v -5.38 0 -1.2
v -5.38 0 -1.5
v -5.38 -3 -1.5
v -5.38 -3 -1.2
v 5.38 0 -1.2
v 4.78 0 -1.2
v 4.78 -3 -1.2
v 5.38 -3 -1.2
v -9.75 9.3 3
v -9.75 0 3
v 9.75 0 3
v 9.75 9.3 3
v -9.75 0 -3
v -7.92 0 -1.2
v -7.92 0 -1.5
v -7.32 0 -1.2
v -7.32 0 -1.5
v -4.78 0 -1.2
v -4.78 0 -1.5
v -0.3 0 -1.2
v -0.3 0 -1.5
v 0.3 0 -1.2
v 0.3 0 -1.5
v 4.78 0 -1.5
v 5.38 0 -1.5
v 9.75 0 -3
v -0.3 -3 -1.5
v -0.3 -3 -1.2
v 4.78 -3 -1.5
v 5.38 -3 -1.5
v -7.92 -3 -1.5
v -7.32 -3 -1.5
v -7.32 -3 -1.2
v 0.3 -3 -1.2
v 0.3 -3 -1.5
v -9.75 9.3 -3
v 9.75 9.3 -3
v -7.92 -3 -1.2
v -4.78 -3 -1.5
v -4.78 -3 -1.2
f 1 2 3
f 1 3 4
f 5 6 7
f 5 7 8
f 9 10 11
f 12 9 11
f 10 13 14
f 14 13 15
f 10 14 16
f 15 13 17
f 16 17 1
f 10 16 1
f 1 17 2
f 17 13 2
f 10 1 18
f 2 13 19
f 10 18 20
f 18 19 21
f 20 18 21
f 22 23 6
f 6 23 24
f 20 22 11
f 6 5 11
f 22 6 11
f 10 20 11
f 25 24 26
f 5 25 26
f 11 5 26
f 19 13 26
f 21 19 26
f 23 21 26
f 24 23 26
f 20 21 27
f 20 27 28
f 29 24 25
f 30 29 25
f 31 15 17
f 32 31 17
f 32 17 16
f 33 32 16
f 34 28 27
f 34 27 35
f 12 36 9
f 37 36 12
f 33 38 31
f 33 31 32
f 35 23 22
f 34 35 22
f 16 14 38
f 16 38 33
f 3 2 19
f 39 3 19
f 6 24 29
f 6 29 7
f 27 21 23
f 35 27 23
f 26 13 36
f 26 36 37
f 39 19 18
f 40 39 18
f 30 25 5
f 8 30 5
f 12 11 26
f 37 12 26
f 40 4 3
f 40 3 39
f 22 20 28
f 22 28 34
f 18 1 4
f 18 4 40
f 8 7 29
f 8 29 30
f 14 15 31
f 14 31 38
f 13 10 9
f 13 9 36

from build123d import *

# Parameters (mm, degrees)
SKETCH_1_W      = 19.5
SKETCH_1_H      = 6
EXTRUDE_1_DEPTH = 9.3
SKETCH_2_W      = 0.6
SKETCH_2_H      = 0.3
EXTRUDE_2_DEPTH = 3
EXTRUDE_3_DEPTH = 0.2


with BuildPart() as part:
    # Эскиз1 → Бобышка-Вытянуть1 (new body)
    with BuildSketch(Plane(origin=(0, 0, 0), x_dir=(1, 0, 0), z_dir=(0, 1, 0))):
        Rectangle(SKETCH_1_W, SKETCH_1_H)
    extrude(amount=EXTRUDE_1_DEPTH)

    # Эскиз2 → Бобышка-Вытянуть2 (add)
    with BuildSketch(Plane.XZ):
        with Locations((-7.62, -1.35)):
            Rectangle(SKETCH_2_W, SKETCH_2_H)
        with Locations((-5.08, -1.35)):
            Rectangle(SKETCH_2_W, SKETCH_2_H)
        with Locations((0, -1.35)):
            Rectangle(SKETCH_2_W, SKETCH_2_H)
        with Locations((5.08, -1.35)):
            Rectangle(SKETCH_2_W, SKETCH_2_H)
    extrude(amount=EXTRUDE_2_DEPTH)

    # Эскиз3 → Бобышка-Вытянуть3 (add)
    with BuildSketch(Plane(origin=(0, 9.3, 0), x_dir=(1, 0, 0), z_dir=(0, 1, 0))):
        with BuildLine():
            Line((-5.993653669, -1.1506083), (-5.993653669, 1.495225034))
            Line((-5.993653669, 1.495225034), (-5.726526265, 1.495225034))
            add(Edge.make_bspline(
                [(-5.726526265, 1.495225034), (-5.703199399, 1.494894605), (-5.65827213, 1.494258204), (-5.593328368, 1.490121291), (-5.533294043, 1.482863062), (-5.478257825, 1.472268509), (-5.427978548, 1.459234752), (-5.382722262, 1.442777118), (-5.342163377, 1.423550544), (-5.318249105, 1.407525081), (-5.30675463, 1.39982239)],
                knots=[0, 0, 0, 0, 6.998e-05, 0.000134781, 0.00019513, 0.000251262, 0.000302815, 0.000350769, 0.00039557, 0.000437033, 0.000437033, 0.000437033, 0.000437033], degree=3))
            add(Edge.make_bspline(
                [(-5.30675463, 1.39982239), (-5.291259723, 1.387980041), (-5.259666671, 1.363834307), (-5.216878942, 1.320049614), (-5.176018095, 1.270953839), (-5.138198125, 1.215037198), (-5.103093917, 1.153229673), (-5.069860634, 1.085379539), (-5.040008142, 1.011214307), (-5.012613306, 0.931196499), (-4.987736933, 0.846373762), (-4.966676113, 0.756972928), (-4.948733764, 0.663775398), (-4.933891633, 0.566532567), (-4.922334069, 0.465223791), (-4.913792213, 0.359881256), (-4.909099881, 0.250617555), (-4.908492313, 0.176552723), (-4.908183583, 0.138917442)],
                knots=[0, 0, 0, 0, 5.8439e-05, 0.000119153, 0.000183146, 0.000249888, 0.000321348, 0.000396253, 0.000476369, 0.000561014, 0.000649908, 0.00074144, 0.000836447, 0.000934568, 0.00103647, 0.001142284, 0.001251571, 0.001364475, 0.001364475, 0.001364475, 0.001364475], degree=3))
            add(Edge.make_bspline(
                [(-4.908183583, 0.138917442), (-4.908280711, 0.106227192), (-4.908471905, 0.041877192), (-4.913150802, -0.053011126), (-4.919308515, -0.144931602), (-4.928055359, -0.233911091), (-4.940620124, -0.319900369), (-4.954621979, -0.403063397), (-4.971578805, -0.483169429), (-4.991199381, -0.559859585), (-5.012673437, -0.632560972), (-5.036144523, -0.700772196), (-5.060756945, -0.763964681), (-5.08687661, -0.822459494), (-5.11469083, -0.875845291), (-5.14459931, -0.924137506), (-5.175194817, -0.968146848), (-5.208238178, -1.00695942), (-5.243405122, -1.041684613), (-5.282312993, -1.070675465), (-5.324207669, -1.095483025), (-5.369598006, -1.115586755), (-5.418401512, -1.131573487), (-5.470683253, -1.142394162), (-5.525977989, -1.149628644), (-5.56396405, -1.150276458), (-5.583422299, -1.1506083)],
                knots=[0, 0, 0, 0, 9.8058e-05, 0.000193026, 0.000284939, 0.000374436, 0.000461159, 0.000545593, 0.000627403, 0.000706717, 0.000783019, 0.000854758, 0.000923064, 0.000986404, 0.001046858, 0.001103491, 0.001156725, 0.001207487, 0.001256214, 0.001304658, 0.001352653, 0.001402001, 0.001453289, 0.00150641, 0.00156196, 0.0016203, 0.0016203, 0.0016203, 0.0016203], degree=3))
            Line((-5.583422299, -1.1506083), (-5.993653669, -1.1506083))
        make_face()
        with BuildLine():
            Line((-5.857969908, -0.879240778), (-5.712215868, -0.879240778))
            add(Edge.make_bspline(
                [(-5.712215868, -0.879240778), (-5.691187559, -0.879056917), (-5.650871591, -0.878704415), (-5.592868926, -0.875504605), (-5.539970165, -0.870356677), (-5.491975474, -0.863079212), (-5.449019914, -0.853425769), (-5.410665043, -0.842750873), (-5.377422356, -0.829210676), (-5.358215906, -0.817468128), (-5.349155806, -0.811928913)],
                knots=[0, 0, 0, 0, 6.3081e-05, 0.00012094, 0.000174206, 0.000222481, 0.000266459, 0.00030621, 0.000341843, 0.000373662, 0.000373662, 0.000373662, 0.000373662], degree=3))
            add(Edge.make_bspline(
                [(-5.349155806, -0.811928913), (-5.337504042, -0.803307558), (-5.313789347, -0.785760618), (-5.280583663, -0.754767955), (-5.250258232, -0.718316423), (-5.220506136, -0.67810954), (-5.194552767, -0.631854361), (-5.168983681, -0.581836894), (-5.145554456, -0.526783834), (-5.124665533, -0.467032902), (-5.105604787, -0.403212154), (-5.089398291, -0.335730556), (-5.074936985, -0.265071796), (-5.063189934, -0.190820741), (-5.055092671, -0.112940991), (-5.048787041, -0.03182255), (-5.044151944, 0.052648833), (-5.043963526, 0.110113423), (-5.043867344, 0.139447456)],
                knots=[0, 0, 0, 0, 4.3464e-05, 8.8463e-05, 0.000135833, 0.000185556, 0.000238281, 0.000294694, 0.000354058, 0.000417592, 0.000484502, 0.00055379, 0.00062572, 0.000700832, 0.000779205, 0.000860546, 0.000944925, 0.001032914, 0.001032914, 0.001032914, 0.001032914], degree=3))
            add(Edge.make_bspline(
                [(-5.043867344, 0.139447456), (-5.044257686, 0.170367783), (-5.045023027, 0.230993015), (-5.04851762, 0.320105791), (-5.055303295, 0.405703496), (-5.065721936, 0.487818585), (-5.0773982, 0.566813362), (-5.093024206, 0.642256147), (-5.110894459, 0.714268364), (-5.131375406, 0.782633857), (-5.154756204, 0.846351158), (-5.179273421, 0.905648959), (-5.207154577, 0.959280213), (-5.236388534, 1.0081843), (-5.26864597, 1.051395115), (-5.302252635, 1.09000415), (-5.339137971, 1.122477508), (-5.365409332, 1.140706418), (-5.378306614, 1.149655456)],
                knots=[0, 0, 0, 0, 9.2766e-05, 0.000181886, 0.000267496, 0.000350263, 0.000430171, 0.000506986, 0.000581287, 0.000652715, 0.000720955, 0.000784843, 0.000845053, 0.000902138, 0.000955564, 0.001006622, 0.001055435, 0.001102508, 0.001102508, 0.001102508, 0.001102508], degree=3))
            add(Edge.make_bspline(
                [(-5.378306614, 1.149655456), (-5.388955984, 1.155743208), (-5.411039459, 1.168367307), (-5.448391882, 1.183007997), (-5.490098558, 1.195464632), (-5.536608314, 1.206268717), (-5.588034553, 1.213841748), (-5.644095768, 1.219565094), (-5.704918011, 1.223470072), (-5.747013657, 1.223724871), (-5.76892744, 1.223857512)],
                knots=[0, 0, 0, 0, 3.6759e-05, 7.6226e-05, 0.000119987, 0.000167301, 0.000219323, 0.000275807, 0.000336342, 0.000402072, 0.000402072, 0.000402072, 0.000402072], degree=3))
            Line((-5.76892744, 1.223857512), (-5.857969908, 1.223857512))
            Line((-5.857969908, 1.223857512), (-5.857969908, -0.879240778))
        make_face(mode=Mode.SUBTRACT)
        with BuildLine():
            Line((-3.415662216, 1.009731578), (-3.519545095, 0.850727171))
            add(Edge.make_bspline(
                [(-3.519545095, 0.850727171), (-3.534179354, 0.884905992), (-3.562170932, 0.950281296), (-3.611133312, 1.040000729), (-3.665533305, 1.116106536), (-3.72384652, 1.179351808), (-3.785927203, 1.2295169), (-3.851769423, 1.265264449), (-3.920886372, 1.287938638), (-3.968476618, 1.290444177), (-3.992318199, 1.291699393)],
                knots=[0, 0, 0, 0, 0.000111505, 0.00021328, 0.000305946, 0.000391448, 0.000470663, 0.000544181, 0.000615258, 0.000686614, 0.000686614, 0.000686614, 0.000686614], degree=3))
            add(Edge.make_bspline(
                [(-3.992318199, 1.291699393), (-4.005431836, 1.291384283), (-4.03169845, 1.290753119), (-4.070396571, 1.282732829), (-4.108512905, 1.271147784), (-4.145817601, 1.254474313), (-4.182279862, 1.233158987), (-4.218304257, 1.207461497), (-4.252957775, 1.176608367), (-4.299075833, 1.128977162), (-4.352642098, 1.059690199), (-4.408114943, 0.964195578), (-4.457114694, 0.856544197), (-4.497127403, 0.73650285), (-4.529213424, 0.606387938), (-4.552370998, 0.467849217), (-4.566279092, 0.321350851), (-4.568060213, 0.221100812), (-4.568974182, 0.169658294)],
                knots=[0, 0, 0, 0, 3.9278e-05, 7.8675e-05, 0.000118071, 0.000158647, 0.000200919, 0.000244603, 0.000291171, 0.000339898, 0.000443375, 0.000552908, 0.000670553, 0.000797599, 0.000931932, 0.001072217, 0.001218621, 0.001372929, 0.001372929, 0.001372929, 0.001372929], degree=3))
            add(Edge.make_bspline(
                [(-4.568974182, 0.169658294), (-4.568505048, 0.130597956), (-4.567586992, 0.054160166), (-4.559240598, -0.057952809), (-4.546936059, -0.165048085), (-4.528789063, -0.267326934), (-4.505707102, -0.364750482), (-4.477047103, -0.45737923), (-4.443102256, -0.544809514), (-4.404897438, -0.626691155), (-4.362284373, -0.700931952), (-4.317155352, -0.766581502), (-4.268464955, -0.821815298), (-4.217519197, -0.867484278), (-4.163381985, -0.903364651), (-4.106076555, -0.928124148), (-4.046251249, -0.944766536), (-4.0051504, -0.946304829), (-3.984367978, -0.947082659)],
                knots=[0, 0, 0, 0, 0.000117163, 0.000229279, 0.000337095, 0.000440441, 0.000540713, 0.000637275, 0.000731075, 0.000821883, 0.000908068, 0.000987615, 0.00106046, 0.00112842, 0.001192368, 0.001254309, 0.001315115, 0.00137731, 0.00137731, 0.00137731, 0.00137731], degree=3))
            add(Edge.make_bspline(
                [(-3.984367978, -0.947082659), (-3.961591638, -0.945772388), (-3.91597232, -0.943148013), (-3.849479838, -0.921072886), (-3.786097826, -0.886024876), (-3.72623861, -0.836482885), (-3.669438198, -0.773568722), (-3.615488809, -0.697122197), (-3.564594685, -0.606919476), (-3.53506219, -0.540833581), (-3.519545095, -0.506110436)],
                knots=[0, 0, 0, 0, 6.8191e-05, 0.000136581, 0.000207984, 0.00028447, 0.000368503, 0.0004616, 0.000564616, 0.000678669, 0.000678669, 0.000678669, 0.000678669], degree=3))
            Line((-3.519545095, -0.506110436), (-3.415662216, -0.663524799))
            add(Edge.make_bspline(
                [(-3.415662216, -0.663524799), (-3.423957596, -0.684978718), (-3.440269776, -0.727166079), (-3.467335967, -0.787728881), (-3.495194986, -0.84501035), (-3.525867748, -0.89780762), (-3.556548419, -0.947988701), (-3.590310996, -0.993379854), (-3.624691432, -1.035567179), (-3.660650472, -1.073847065), (-3.698141543, -1.107588466), (-3.736619231, -1.137280461), (-3.77637805, -1.161955477), (-3.816885086, -1.183164813), (-3.85890478, -1.199070077), (-3.902132842, -1.210062204), (-3.946310126, -1.217400972), (-3.976211705, -1.218098955), (-3.991258169, -1.21845018)],
                knots=[0, 0, 0, 0, 6.8994e-05, 0.00013567, 0.000198958, 0.000259965, 0.000318787, 0.00037529, 0.000429512, 0.000482002, 0.000532665, 0.000580686, 0.000627598, 0.000672873, 0.000717662, 0.000762012, 0.00080654, 0.000851641, 0.000851641, 0.000851641, 0.000851641], degree=3))
            add(Edge.make_bspline(
                [(-3.991258169, -1.21845018), (-4.019498028, -1.217044905), (-4.0752501, -1.214270565), (-4.156243448, -1.191380627), (-4.232478086, -1.154894405), (-4.303933806, -1.103497233), (-4.369809131, -1.03705277), (-4.431329731, -0.956814193), (-4.488334905, -0.862118671), (-4.520381829, -0.792319622), (-4.5371733, -0.755747355)],
                knots=[0, 0, 0, 0, 8.4598e-05, 0.000167017, 0.000250464, 0.000337091, 0.000429662, 0.000530164, 0.000639786, 0.000760445, 0.000760445, 0.000760445, 0.000760445], degree=3))
            add(Edge.make_bspline(
                [(-4.5371733, -0.755747355), (-4.550705935, -0.722524172), (-4.578175766, -0.655084593), (-4.611354565, -0.549272101), (-4.641067127, -0.438918067), (-4.663731428, -0.323171427), (-4.682780542, -0.202666631), (-4.694840811, -0.076988272), (-4.7032721, 0.053646598), (-4.704190154, 0.142436449), (-4.704657942, 0.187678793)],
                knots=[0, 0, 0, 0, 0.000107577, 0.000218371, 0.000332403, 0.000450276, 0.000572011, 0.000698267, 0.000828893, 0.000964602, 0.000964602, 0.000964602, 0.000964602], degree=3))
            add(Edge.make_bspline(
                [(-4.704657942, 0.187678793), (-4.704071921, 0.235219874), (-4.702922615, 0.328457448), (-4.693182896, 0.465378871), (-4.677450347, 0.596485968), (-4.655352591, 0.721825733), (-4.626464582, 0.841351733), (-4.592607123, 0.955511927), (-4.550817993, 1.063548764), (-4.503763829, 1.164964211), (-4.452114913, 1.257588782), (-4.39660512, 1.338869898), (-4.33732567, 1.407454084), (-4.27538001, 1.464439326), (-4.209548403, 1.508797556), (-4.140164332, 1.539888447), (-4.067577761, 1.559396918), (-4.017878723, 1.561837656), (-3.992848213, 1.563066914)],
                knots=[0, 0, 0, 0, 0.000142609, 0.000279686, 0.000411561, 0.00053861, 0.00066125, 0.000780297, 0.000895559, 0.001008427, 0.001115455, 0.00121337, 0.001303168, 0.001386845, 0.001465196, 0.00154016, 0.001614078, 0.00168908, 0.00168908, 0.00168908, 0.00168908], degree=3))
            add(Edge.make_bspline(
                [(-3.992848213, 1.563066914), (-3.977627939, 1.562703678), (-3.947380615, 1.561981816), (-3.902594067, 1.554813267), (-3.859097397, 1.543179618), (-3.816832763, 1.526858437), (-3.775181493, 1.507110913), (-3.73550092, 1.4809088), (-3.696205136, 1.451551931), (-3.658548924, 1.417201519), (-3.62206409, 1.379288724), (-3.587540342, 1.337134575), (-3.554988139, 1.291302038), (-3.522540397, 1.242799461), (-3.494096057, 1.189331801), (-3.46554633, 1.133068857), (-3.43918824, 1.072902791), (-3.423587095, 1.031011171), (-3.415662216, 1.009731578)],
                knots=[0, 0, 0, 0, 4.5631e-05, 9.0682e-05, 0.00013568, 0.000180469, 0.000226455, 0.00027365, 0.000322836, 0.000373499, 0.000426354, 0.000480576, 0.000536768, 0.000594983, 0.000655472, 0.000718285, 0.000784263, 0.000852377, 0.000852377, 0.000852377, 0.000852377], degree=3))
        make_face()
        with BuildLine():
            Line((-1.448247686, 1.009731578), (-1.552130565, 0.850727171))
            add(Edge.make_bspline(
                [(-1.552130565, 0.850727171), (-1.566764824, 0.884905992), (-1.594756402, 0.950281296), (-1.643718782, 1.040000729), (-1.698118775, 1.116106536), (-1.75643199, 1.179351808), (-1.818512673, 1.2295169), (-1.884354893, 1.265264449), (-1.953471842, 1.287938638), (-2.001062088, 1.290444177), (-2.024903669, 1.291699393)],
                knots=[0, 0, 0, 0, 0.000111505, 0.00021328, 0.000305946, 0.000391448, 0.000470663, 0.000544181, 0.000615258, 0.000686614, 0.000686614, 0.000686614, 0.000686614], degree=3))
            add(Edge.make_bspline(
                [(-2.024903669, 1.291699393), (-2.038017306, 1.291384283), (-2.06428392, 1.290753119), (-2.102982041, 1.282732829), (-2.141098375, 1.271147784), (-2.178403071, 1.254474313), (-2.214865332, 1.233158987), (-2.250889728, 1.207461497), (-2.285543246, 1.176608367), (-2.331661303, 1.128977162), (-2.385227568, 1.059690199), (-2.440700413, 0.964195578), (-2.489700164, 0.856544197), (-2.529712873, 0.73650285), (-2.561798894, 0.606387938), (-2.584956468, 0.467849217), (-2.598864562, 0.321350851), (-2.600645683, 0.221100812), (-2.601559652, 0.169658294)],
                knots=[0, 0, 0, 0, 3.9278e-05, 7.8675e-05, 0.000118071, 0.000158647, 0.000200919, 0.000244603, 0.000291171, 0.000339898, 0.000443375, 0.000552908, 0.000670553, 0.000797599, 0.000931932, 0.001072217, 0.001218621, 0.001372929, 0.001372929, 0.001372929, 0.001372929], degree=3))
            add(Edge.make_bspline(
                [(-2.601559652, 0.169658294), (-2.601090518, 0.130597956), (-2.600172462, 0.054160166), (-2.591826069, -0.057952809), (-2.579521529, -0.165048085), (-2.561374533, -0.267326934), (-2.538292572, -0.364750482), (-2.509632573, -0.45737923), (-2.475687726, -0.544809514), (-2.437482908, -0.626691155), (-2.394869843, -0.700931952), (-2.349740822, -0.766581502), (-2.301050425, -0.821815298), (-2.250104667, -0.867484278), (-2.195967455, -0.903364651), (-2.138662025, -0.928124148), (-2.078836719, -0.944766536), (-2.03773587, -0.946304829), (-2.016953448, -0.947082659)],
                knots=[0, 0, 0, 0, 0.000117163, 0.000229279, 0.000337095, 0.000440441, 0.000540713, 0.000637275, 0.000731075, 0.000821883, 0.000908068, 0.000987615, 0.00106046, 0.00112842, 0.001192368, 0.001254309, 0.001315115, 0.00137731, 0.00137731, 0.00137731, 0.00137731], degree=3))
            add(Edge.make_bspline(
                [(-2.016953448, -0.947082659), (-1.994177108, -0.945772388), (-1.94855779, -0.943148013), (-1.882065308, -0.921072886), (-1.818683296, -0.886024876), (-1.75882408, -0.836482885), (-1.702023668, -0.773568722), (-1.648074279, -0.697122197), (-1.597180155, -0.606919476), (-1.56764766, -0.540833581), (-1.552130565, -0.506110436)],
                knots=[0, 0, 0, 0, 6.8191e-05, 0.000136581, 0.000207984, 0.00028447, 0.000368503, 0.0004616, 0.000564616, 0.000678669, 0.000678669, 0.000678669, 0.000678669], degree=3))
            Line((-1.552130565, -0.506110436), (-1.448247686, -0.663524799))
            add(Edge.make_bspline(
                [(-1.448247686, -0.663524799), (-1.456543066, -0.684978718), (-1.472855246, -0.727166079), (-1.499921437, -0.787728881), (-1.527780456, -0.84501035), (-1.558453218, -0.89780762), (-1.589133889, -0.947988701), (-1.622896466, -0.993379854), (-1.657276903, -1.035567179), (-1.693235942, -1.073847065), (-1.730727013, -1.107588466), (-1.769204701, -1.137280461), (-1.80896352, -1.161955477), (-1.849470556, -1.183164813), (-1.89149025, -1.199070077), (-1.934718312, -1.210062204), (-1.978895596, -1.217400972), (-2.008797175, -1.218098955), (-2.023843639, -1.21845018)],
                knots=[0, 0, 0, 0, 6.8994e-05, 0.00013567, 0.000198958, 0.000259965, 0.000318787, 0.00037529, 0.000429512, 0.000482002, 0.000532665, 0.000580686, 0.000627598, 0.000672873, 0.000717662, 0.000762012, 0.00080654, 0.000851641, 0.000851641, 0.000851641, 0.000851641], degree=3))
            add(Edge.make_bspline(
                [(-2.023843639, -1.21845018), (-2.052083499, -1.217044905), (-2.10783557, -1.214270565), (-2.188828918, -1.191380627), (-2.265063556, -1.154894405), (-2.336519276, -1.103497233), (-2.402394601, -1.03705277), (-2.463915201, -0.956814193), (-2.520920375, -0.862118671), (-2.552967299, -0.792319622), (-2.56975877, -0.755747355)],
                knots=[0, 0, 0, 0, 8.4598e-05, 0.000167017, 0.000250464, 0.000337091, 0.000429662, 0.000530164, 0.000639786, 0.000760445, 0.000760445, 0.000760445, 0.000760445], degree=3))
            add(Edge.make_bspline(
                [(-2.56975877, -0.755747355), (-2.583291406, -0.722524172), (-2.610761236, -0.655084593), (-2.643940035, -0.549272101), (-2.673652597, -0.438918067), (-2.696316898, -0.323171427), (-2.715366012, -0.202666631), (-2.727426281, -0.076988272), (-2.73585757, 0.053646598), (-2.736775624, 0.142436449), (-2.737243412, 0.187678793)],
                knots=[0, 0, 0, 0, 0.000107577, 0.000218371, 0.000332403, 0.000450276, 0.000572011, 0.000698267, 0.000828893, 0.000964602, 0.000964602, 0.000964602, 0.000964602], degree=3))
            add(Edge.make_bspline(
                [(-2.737243412, 0.187678793), (-2.736657391, 0.235219874), (-2.735508085, 0.328457448), (-2.725768366, 0.465378871), (-2.710035817, 0.596485968), (-2.687938062, 0.721825733), (-2.659050052, 0.841351733), (-2.625192593, 0.955511927), (-2.583403463, 1.063548764), (-2.536349299, 1.164964211), (-2.484700383, 1.257588782), (-2.42919059, 1.338869898), (-2.36991114, 1.407454084), (-2.307965481, 1.464439326), (-2.242133873, 1.508797556), (-2.172749802, 1.539888447), (-2.100163231, 1.559396918), (-2.050464193, 1.561837656), (-2.025433684, 1.563066914)],
                knots=[0, 0, 0, 0, 0.000142609, 0.000279686, 0.000411561, 0.00053861, 0.00066125, 0.000780297, 0.000895559, 0.001008427, 0.001115455, 0.00121337, 0.001303168, 0.001386845, 0.001465196, 0.00154016, 0.001614078, 0.00168908, 0.00168908, 0.00168908, 0.00168908], degree=3))
            add(Edge.make_bspline(
                [(-2.025433684, 1.563066914), (-2.010213409, 1.562703678), (-1.979966085, 1.561981816), (-1.935179537, 1.554813267), (-1.891682868, 1.543179618), (-1.849418233, 1.526858437), (-1.807766963, 1.507110913), (-1.76808639, 1.4809088), (-1.728790606, 1.451551931), (-1.691134394, 1.417201519), (-1.65464956, 1.379288724), (-1.620125812, 1.337134575), (-1.587573609, 1.291302038), (-1.555125867, 1.242799461), (-1.526681527, 1.189331801), (-1.4981318, 1.133068857), (-1.47177371, 1.072902791), (-1.456172565, 1.031011171), (-1.448247686, 1.009731578)],
                knots=[0, 0, 0, 0, 4.5631e-05, 9.0682e-05, 0.00013568, 0.000180469, 0.000226455, 0.00027365, 0.000322836, 0.000373499, 0.000426354, 0.000480576, 0.000536768, 0.000594983, 0.000655472, 0.000718285, 0.000784263, 0.000852377, 0.000852377, 0.000852377, 0.000852377], degree=3))
        make_face()
        with BuildLine():
            add(Edge.make_bspline(
                [(-0.786259338, 0.81680623), (-0.768295824, 0.81600169), (-0.732566431, 0.81440146), (-0.680834558, 0.797931704), (-0.631820933, 0.772336496), (-0.584557205, 0.737517515), (-0.540776603, 0.69167794), (-0.499317995, 0.636359406), (-0.460000564, 0.571323038), (-0.437251962, 0.523403355), (-0.425319334, 0.498267402)],
                knots=[0, 0, 0, 0, 5.3744e-05, 0.000106896, 0.00016118, 0.000219166, 0.000282133, 0.000350611, 0.000426238, 0.000509673, 0.000509673, 0.000509673, 0.000509673], degree=3))
            add(Edge.make_bspline(
                [(-0.425319334, 0.498267402), (-0.414728297, 0.473668234), (-0.393285396, 0.423864093), (-0.367227345, 0.345950642), (-0.344949151, 0.264885756), (-0.326032015, 0.180605301), (-0.313037159, 0.092656107), (-0.301778331, 0.001715256), (-0.296325548, -0.092631811), (-0.295403832, -0.15664916), (-0.29493572, -0.189161652)],
                knots=[0, 0, 0, 0, 8.0318e-05, 0.000162614, 0.000246195, 0.000332485, 0.00042154, 0.00051279, 0.000607313, 0.000704858, 0.000704858, 0.000704858, 0.000704858], degree=3))
            add(Edge.make_bspline(
                [(-0.29493572, -0.189161652), (-0.295349578, -0.221853946), (-0.296164678, -0.286241839), (-0.302406615, -0.381280091), (-0.313947295, -0.473153634), (-0.328136117, -0.562148356), (-0.348363023, -0.647748537), (-0.37105115, -0.730502442), (-0.399616521, -0.809793204), (-0.431334519, -0.885135131), (-0.466002773, -0.954682557), (-0.504376532, -1.015419427), (-0.54439823, -1.067563046), (-0.587749138, -1.110045823), (-0.633497994, -1.143475031), (-0.68201447, -1.167387439), (-0.73332845, -1.181735338), (-0.768503084, -1.183591994), (-0.786259338, -1.18452924)],
                knots=[0, 0, 0, 0, 9.8076e-05, 0.000193161, 0.000285527, 0.000375798, 0.000463354, 0.000549262, 0.000633082, 0.000715969, 0.000794428, 0.000865891, 0.000931204, 0.000991173, 0.001047364, 0.001100461, 0.001152664, 0.00120588, 0.00120588, 0.00120588, 0.00120588], degree=3))
            add(Edge.make_bspline(
                [(-0.786259338, -1.18452924), (-0.804011064, -1.183573351), (-0.839347322, -1.181670576), (-0.890886446, -1.167497137), (-0.939563391, -1.143481638), (-0.985339642, -1.109901724), (-1.029169741, -1.067601137), (-1.069769751, -1.015582232), (-1.108089348, -0.954665248), (-1.142724365, -0.885122221), (-1.174700554, -0.80992249), (-1.202146645, -0.73027545), (-1.226196077, -0.647953081), (-1.244970492, -0.561981879), (-1.260604899, -0.473275738), (-1.270903559, -0.381222106), (-1.277484843, -0.286251606), (-1.278252974, -0.221857236), (-1.278642985, -0.189161652)],
                knots=[0, 0, 0, 0, 5.3216e-05, 0.00010593, 0.000159027, 0.000215219, 0.000275568, 0.000341209, 0.000412672, 0.000491131, 0.000574018, 0.000657661, 0.000743715, 0.000831155, 0.000921514, 0.001013817, 0.001108903, 0.001206978, 0.001206978, 0.001206978, 0.001206978], degree=3))
            add(Edge.make_bspline(
                [(-1.278642985, -0.189161652), (-1.278178442, -0.156824813), (-1.277261294, -0.092982179), (-1.271726731, 0.001172955), (-1.260822889, 0.092024459), (-1.246682351, 0.179421159), (-1.228663621, 0.263684197), (-1.206507249, 0.344591254), (-1.180178476, 0.422410198), (-1.158834277, 0.472072399), (-1.148259371, 0.496677358)],
                knots=[0, 0, 0, 0, 9.7016e-05, 0.000191538, 0.000282789, 0.000371404, 0.000457064, 0.000541156, 0.00062295, 0.000703268, 0.000703268, 0.000703268, 0.000703268], degree=3))
            add(Edge.make_bspline(
                [(-1.148259371, 0.496677358), (-1.136349283, 0.522002036), (-1.113704774, 0.570151549), (-1.074129905, 0.635502295), (-1.032470577, 0.691022688), (-0.988335287, 0.736710879), (-0.941784971, 0.772713123), (-0.892146266, 0.797870409), (-0.840124761, 0.814365676), (-0.804223805, 0.81599229), (-0.786259338, 0.81680623)],
                knots=[0, 0, 0, 0, 8.391e-05, 0.000159537, 0.000228758, 0.000291725, 0.000349604, 0.000404359, 0.000458019, 0.000511763, 0.000511763, 0.000511763, 0.000511763], degree=3))
        make_face()
        with BuildLine():
            add(Edge.make_bspline(
                [(-0.786789353, 0.579359649), (-0.798886218, 0.578626652), (-0.82301766, 0.577164431), (-0.858223157, 0.565790098), (-0.891985195, 0.54813109), (-0.924214219, 0.522841727), (-0.955425443, 0.491122233), (-0.984444916, 0.45166165), (-1.012618435, 0.40574868), (-1.03916386, 0.353446946), (-1.063119203, 0.295895135), (-1.08500333, 0.23517698), (-1.103007324, 0.171409901), (-1.117135786, 0.10458493), (-1.128804156, 0.034930636), (-1.137341087, -0.03775207), (-1.142056769, -0.113305513), (-1.142654463, -0.164597934), (-1.142959224, -0.190751696)],
                knots=[0, 0, 0, 0, 3.6231e-05, 7.2276e-05, 0.000109971, 0.000150042, 0.000194642, 0.000243086, 0.000296628, 0.000356124, 0.000418829, 0.000483539, 0.000549644, 0.000617424, 0.000688351, 0.000761457, 0.00083687, 0.000915328, 0.000915328, 0.000915328, 0.000915328], degree=3))
            add(Edge.make_bspline(
                [(-1.142959224, -0.190751696), (-1.142326427, -0.224516359), (-1.141078433, -0.291106612), (-1.131865071, -0.389182871), (-1.117149789, -0.483748531), (-1.096763284, -0.57357852), (-1.071413696, -0.656915723), (-1.040686032, -0.730903139), (-1.007123923, -0.795724965), (-0.968484024, -0.849369276), (-0.926864889, -0.892616434), (-0.88217378, -0.923391467), (-0.835469388, -0.943959249), (-0.80288704, -0.946049798), (-0.786789353, -0.947082659)],
                knots=[0, 0, 0, 0, 0.000101283, 0.000199749, 0.000295251, 0.000388211, 0.000475888, 0.000556206, 0.000628288, 0.000694338, 0.000753929, 0.000807295, 0.000856506, 0.000904562, 0.000904562, 0.000904562, 0.000904562], degree=3))
            add(Edge.make_bspline(
                [(-0.786789353, -0.947082659), (-0.77069017, -0.946051352), (-0.738104797, -0.943963948), (-0.691424169, -0.923371461), (-0.646733496, -0.892772774), (-0.605620341, -0.849183125), (-0.567073213, -0.795601378), (-0.532659256, -0.731179148), (-0.50286572, -0.656761062), (-0.477438741, -0.573529964), (-0.456264431, -0.483823389), (-0.441761172, -0.389172967), (-0.432487835, -0.291109204), (-0.431248093, -0.224517231), (-0.430619481, -0.190751696)],
                knots=[0, 0, 0, 0, 4.8056e-05, 9.7268e-05, 0.000150634, 0.000209853, 0.000275903, 0.000348236, 0.000428353, 0.00051603, 0.000609109, 0.000704611, 0.000803077, 0.00090436, 0.00090436, 0.00090436, 0.00090436], degree=3))
            add(Edge.make_bspline(
                [(-0.430619481, -0.190751696), (-0.430925486, -0.16459819), (-0.431525619, -0.11330627), (-0.43622373, -0.037749215), (-0.444824287, 0.034920411), (-0.456272696, 0.104658662), (-0.471208982, 0.171356384), (-0.489265037, 0.235049505), (-0.51018443, 0.296139923), (-0.535093194, 0.353316751), (-0.561497144, 0.405725377), (-0.589562433, 0.451883468), (-0.619282428, 0.490756408), (-0.649875101, 0.523027156), (-0.68215154, 0.548104718), (-0.715878749, 0.56579737), (-0.750923549, 0.577105458), (-0.774871983, 0.578610634), (-0.786789353, 0.579359649)],
                knots=[0, 0, 0, 0, 7.8458e-05, 0.000153871, 0.000226977, 0.000297904, 0.000365798, 0.000431903, 0.000496436, 0.00055935, 0.000618846, 0.000672388, 0.000721152, 0.000765382, 0.000805454, 0.000843148, 0.000879193, 0.000914897, 0.000914897, 0.000914897, 0.000914897], degree=3))
        make_face(mode=Mode.SUBTRACT)
        with BuildLine():
            Line((-0.057489139, 0.78288529), (0.078194622, 0.78288529))
            Line((0.078194622, 0.78288529), (0.078194622, 0.434135624))
            add(Edge.make_bspline(
                [(0.078194622, 0.434135624), (0.090473003, 0.465415577), (0.113637798, 0.524429355), (0.152949616, 0.604831872), (0.194834574, 0.671538016), (0.238889072, 0.724881992), (0.285305471, 0.765981762), (0.333906321, 0.795133405), (0.385061357, 0.813338806), (0.420090417, 0.815653081), (0.437544582, 0.81680623)],
                knots=[0, 0, 0, 0, 0.000100786, 0.000190147, 0.000268074, 0.000336546, 0.000397026, 0.00045311, 0.000505739, 0.000558007, 0.000558007, 0.000558007, 0.000558007], degree=3))
            add(Edge.make_bspline(
                [(0.437544582, 0.81680623), (0.455045862, 0.815427277), (0.490332639, 0.812646977), (0.541313346, 0.791060513), (0.58784322, 0.755227665), (0.630597175, 0.706886804), (0.668635136, 0.647182672), (0.702902382, 0.578089279), (0.729745898, 0.498723058), (0.748524014, 0.426327988), (0.761213854, 0.361580804), (0.768691001, 0.305613031), (0.775834597, 0.243267015), (0.780778935, 0.174469796), (0.78505622, 0.099200266), (0.788120457, 0.017386139), (0.790404417, -0.070778848), (0.790490142, -0.13174174), (0.790534365, -0.163190932)],
                knots=[0, 0, 0, 0, 5.2396e-05, 0.000105644, 0.000163203, 0.000227379, 0.000298237, 0.000375036, 0.000458179, 0.000549065, 0.000599271, 0.000656013, 0.000718406, 0.000787511, 0.000862893, 0.000944577, 0.001033115, 0.001127459, 0.001127459, 0.001127459, 0.001127459], degree=3))
            Line((0.790534365, -0.163190932), (0.790534365, -1.1506083))
            Line((0.790534365, -1.1506083), (0.654850605, -1.1506083))
            Line((0.654850605, -1.1506083), (0.654850605, -0.241103091))
            add(Edge.make_bspline(
                [(0.654850605, -0.241103091), (0.654901746, -0.214778869), (0.654999567, -0.164426518), (0.654336012, -0.092345224), (0.653763884, -0.02697789), (0.653483685, 0.031507299), (0.65219473, 0.083088841), (0.651385129, 0.127800377), (0.649722976, 0.165603399), (0.648504281, 0.188562951), (0.647960414, 0.198809102)],
                knots=[0, 0, 0, 0, 7.8972e-05, 0.000151056, 0.00021625, 0.000275084, 0.000326506, 0.00037104, 0.000409234, 0.000440016, 0.000440016, 0.000440016, 0.000440016], degree=3))
            add(Edge.make_bspline(
                [(0.647960414, 0.198809102), (0.64571324, 0.228557571), (0.641486532, 0.28451144), (0.62687992, 0.362254523), (0.606153204, 0.428513347), (0.578600593, 0.482865252), (0.545764184, 0.526038935), (0.507034395, 0.556869493), (0.463086331, 0.576376873), (0.43173428, 0.578355115), (0.415813979, 0.579359649)],
                knots=[0, 0, 0, 0, 8.9445e-05, 0.000168238, 0.00023679, 0.000297, 0.000350226, 0.000398154, 0.000444225, 0.000491756, 0.000491756, 0.000491756, 0.000491756], degree=3))
            add(Edge.make_bspline(
                [(0.415813979, 0.579359649), (0.406406609, 0.579000598), (0.387683893, 0.578286007), (0.360081539, 0.570938273), (0.33358275, 0.559116182), (0.307478381, 0.542965196), (0.283097594, 0.521327564), (0.258056496, 0.496442104), (0.235236892, 0.465799284), (0.204330303, 0.41932629), (0.17016809, 0.353300208), (0.137666461, 0.265797944), (0.111887842, 0.169787872), (0.101560782, 0.102299758), (0.096215121, 0.067365458)],
                knots=[0, 0, 0, 0, 2.8171e-05, 5.6066e-05, 8.5018e-05, 0.000115019, 0.00014773, 0.000182586, 0.000220751, 0.000262058, 0.000350012, 0.000442939, 0.000541675, 0.000647632, 0.000647632, 0.000647632, 0.000647632], degree=3))
            add(Edge.make_bspline(
                [(0.096215121, 0.067365458), (0.094722013, 0.054299406), (0.091458026, 0.02573656), (0.088018321, -0.020765347), (0.084618429, -0.074640369), (0.082974455, -0.135808744), (0.080627648, -0.204343685), (0.078962715, -0.280139749), (0.078777293, -0.363360428), (0.078394295, -0.421308327), (0.078194622, -0.451518923)],
                knots=[0, 0, 0, 0, 3.945e-05, 8.6238e-05, 0.000139864, 0.000201382, 0.000269787, 0.000345596, 0.00042881, 0.000519444, 0.000519444, 0.000519444, 0.000519444], degree=3))
            Line((0.078194622, -0.451518923), (0.078194622, -1.1506083))
            Line((0.078194622, -1.1506083), (-0.057489139, -1.1506083))
            Line((-0.057489139, -1.1506083), (-0.057489139, 0.78288529))
        make_face()
        Polygon((0.960139066, 0.78288529), (1.109073194, 0.78288529), (1.418071759, -0.572362273), (1.727070323, 0.78288529), (1.876004451, 0.78288529), (1.435032229, -1.1506083), (1.401111288, -1.1506083), align=None)
        with BuildLine():
            Line((2.889922553, -0.540031376), (2.995395476, -0.650804447))
            add(Edge.make_bspline(
                [(2.995395476, -0.650804447), (2.986843686, -0.680395232), (2.970487553, -0.736990493), (2.942521837, -0.817003839), (2.912057191, -0.887868362), (2.879457332, -0.949958174), (2.845538594, -1.004400122), (2.808633959, -1.051024034), (2.770596064, -1.092025781), (2.729664271, -1.125657126), (2.686351339, -1.152060238), (2.640309908, -1.171116269), (2.591364043, -1.182420247), (2.557661232, -1.183821614), (2.540642872, -1.18452924)],
                knots=[0, 0, 0, 0, 9.2394e-05, 0.000176713, 0.000254103, 0.000323567, 0.000386941, 0.00044621, 0.000501698, 0.000554428, 0.000604603, 0.000653324, 0.00070334, 0.000754356, 0.000754356, 0.000754356, 0.000754356], degree=3))
            add(Edge.make_bspline(
                [(2.540642872, -1.18452924), (2.521647414, -1.183640859), (2.484157345, -1.181887521), (2.429827944, -1.167040394), (2.379028756, -1.142547769), (2.331434963, -1.108631038), (2.287208639, -1.064982098), (2.246363966, -1.011876656), (2.208773445, -0.949358119), (2.175199734, -0.878407616), (2.14487345, -0.80181485), (2.118547256, -0.721543549), (2.095394935, -0.638913847), (2.077792903, -0.553454635), (2.063477122, -0.465928955), (2.052550216, -0.375963316), (2.046997499, -0.283399275), (2.046075144, -0.220792035), (2.045609152, -0.189161652)],
                knots=[0, 0, 0, 0, 5.6912e-05, 0.000112323, 0.000167559, 0.000225353, 0.000286821, 0.000353295, 0.000425831, 0.000505245, 0.00058851, 0.000672815, 0.000758581, 0.000845796, 0.000934411, 0.001024609, 0.001117544, 0.001212441, 0.001212441, 0.001212441, 0.001212441], degree=3))
            add(Edge.make_bspline(
                [(2.045609152, -0.189161652), (2.045873668, -0.15947328), (2.04639684, -0.100754205), (2.051786754, -0.01391278), (2.060890014, 0.070583535), (2.073022901, 0.152637188), (2.088213979, 0.232307843), (2.107431802, 0.309412503), (2.130019131, 0.384099099), (2.148006457, 0.4324547), (2.156912237, 0.456396241)],
                knots=[0, 0, 0, 0, 8.9057e-05, 0.000176141, 0.000260893, 0.000343945, 0.000424919, 0.000504105, 0.000582235, 0.000658852, 0.000658852, 0.000658852, 0.000658852], degree=3))
            add(Edge.make_bspline(
                [(2.156912237, 0.456396241), (2.168632995, 0.484695311), (2.191034257, 0.538781819), (2.230346554, 0.612710631), (2.273772183, 0.674835599), (2.319012731, 0.726769821), (2.368669983, 0.766678288), (2.420853593, 0.796196308), (2.477065364, 0.813266793), (2.515446352, 0.815619232), (2.534812711, 0.81680623)],
                knots=[0, 0, 0, 0, 9.1865e-05, 0.000175578, 0.000250565, 0.000318877, 0.000381455, 0.00044076, 0.00049777, 0.000555835, 0.000555835, 0.000555835, 0.000555835], degree=3))
            add(Edge.make_bspline(
                [(2.534812711, 0.81680623), (2.554748952, 0.815766124), (2.594405397, 0.813697184), (2.65183856, 0.794307188), (2.706052042, 0.764148707), (2.757036124, 0.721954325), (2.803761609, 0.667157498), (2.84741589, 0.600847797), (2.889054115, 0.523315753), (2.911878401, 0.466198207), (2.923843493, 0.436255683)],
                knots=[0, 0, 0, 0, 5.9647e-05, 0.000118648, 0.000179857, 0.000245006, 0.000316006, 0.000395092, 0.000482825, 0.000579493, 0.000579493, 0.000579493, 0.000579493], degree=3))
            add(Edge.make_bspline(
                [(2.923843493, 0.436255683), (2.932239182, 0.413201379), (2.949323145, 0.366289341), (2.97040868, 0.292615183), (2.988276388, 0.214921509), (3.003065321, 0.133027608), (3.014880028, 0.047109802), (3.022341437, -0.043136194), (3.02798877, -0.137504611), (3.028867626, -0.201873), (3.029316417, -0.234742915)],
                knots=[0, 0, 0, 0, 7.3588e-05, 0.000149741, 0.00022971, 0.00031267, 0.000399321, 0.000489773, 0.000584265, 0.00068287, 0.00068287, 0.00068287, 0.00068287], degree=3))
            Line((3.029316417, -0.234742915), (2.181292912, -0.234742915))
            add(Edge.make_bspline(
                [(2.181292912, -0.234742915), (2.181678495, -0.260200358), (2.182434624, -0.310122463), (2.188977195, -0.383062876), (2.196139028, -0.452732985), (2.208276721, -0.518418832), (2.222091078, -0.580931888), (2.240558167, -0.639413961), (2.260293019, -0.695188709), (2.284027297, -0.746442985), (2.309787431, -0.793118227), (2.337226816, -0.833957866), (2.365822227, -0.868954932), (2.396201902, -0.897441422), (2.428280632, -0.919689367), (2.462240249, -0.935137296), (2.497484372, -0.945279826), (2.521671877, -0.946482143), (2.533752681, -0.947082659)],
                knots=[0, 0, 0, 0, 7.6352e-05, 0.000149726, 0.000219611, 0.000286359, 0.000350001, 0.000411531, 0.000470216, 0.000527372, 0.000580756, 0.000630002, 0.000674791, 0.000716043, 0.00075456, 0.000791319, 0.000827577, 0.000863758, 0.000863758, 0.000863758, 0.000863758], degree=3))
            add(Edge.make_bspline(
                [(2.533752681, -0.947082659), (2.545639735, -0.946606939), (2.569542184, -0.945650364), (2.604974005, -0.936674712), (2.639639986, -0.922120349), (2.67346179, -0.902275022), (2.70623002, -0.878366002), (2.735712001, -0.849147568), (2.763591626, -0.817379685), (2.789389289, -0.780548935), (2.813785808, -0.735605494), (2.838760192, -0.680839707), (2.864834398, -0.614459415), (2.881140963, -0.566083374), (2.889922553, -0.540031376)],
                knots=[0, 0, 0, 0, 3.561e-05, 7.1604e-05, 0.000108909, 0.000148091, 0.000189008, 0.00023024, 0.000272322, 0.0003157, 0.000364811, 0.00042552, 0.000496187, 0.000578655, 0.000578655, 0.000578655, 0.000578655], degree=3))
        make_face()
        with BuildLine():
            add(Edge.make_bspline(
                [(2.893632656, 0.002703666), (2.889284009, 0.034010969), (2.881026115, 0.093462193), (2.865510163, 0.177480153), (2.846565928, 0.2513368), (2.824740419, 0.316092891), (2.799611473, 0.373076112), (2.771085822, 0.423985739), (2.738043629, 0.468621467), (2.702141544, 0.507162291), (2.664626545, 0.539697143), (2.624200455, 0.561871031), (2.583241391, 0.577163797), (2.555082473, 0.57863361), (2.541172887, 0.579359649)],
                knots=[0, 0, 0, 0, 9.4819e-05, 0.000180058, 0.000256161, 0.000323372, 0.000384829, 0.000442746, 0.000498081, 0.000550958, 0.000600633, 0.000646192, 0.000688765, 0.000730323, 0.000730323, 0.000730323, 0.000730323], degree=3))
            add(Edge.make_bspline(
                [(2.541172887, 0.579359649), (2.529816757, 0.578884512), (2.507133469, 0.577935449), (2.47385806, 0.569147519), (2.442189002, 0.554200788), (2.410982235, 0.534723183), (2.382227004, 0.508241261), (2.354132644, 0.476873625), (2.327269582, 0.439956298), (2.31141713, 0.412390057), (2.303196291, 0.398094625)],
                knots=[0, 0, 0, 0, 3.4024e-05, 6.7962e-05, 0.000102352, 0.000138815, 0.000177856, 0.000219143, 0.000265047, 0.000314495, 0.000314495, 0.000314495, 0.000314495], degree=3))
            add(Edge.make_bspline(
                [(2.303196291, 0.398094625), (2.297196818, 0.386514034), (2.284674217, 0.362342057), (2.268605675, 0.323043588), (2.25313396, 0.279922048), (2.238820492, 0.232510016), (2.225838271, 0.18081587), (2.213491386, 0.125196651), (2.203104027, 0.065346625), (2.196768047, 0.02409169), (2.19348325, 0.002703666)],
                knots=[0, 0, 0, 0, 3.911e-05, 8.1633e-05, 0.000127233, 0.000176527, 0.000230132, 0.000287103, 0.000347404, 0.000412322, 0.000412322, 0.000412322, 0.000412322], degree=3))
            Line((2.19348325, 0.002703666), (2.893632656, 0.002703666))
        make_face(mode=Mode.SUBTRACT)
        with BuildLine():
            Line((3.232842058, 0.78288529), (3.368525818, 0.78288529))
            Line((3.368525818, 0.78288529), (3.368525818, 0.498267402))
            add(Edge.make_bspline(
                [(3.368525818, 0.498267402), (3.377158654, 0.524552332), (3.393329778, 0.573789553), (3.42143135, 0.640457161), (3.449280172, 0.695972089), (3.478235876, 0.740367655), (3.508981153, 0.773639524), (3.5391453, 0.798808716), (3.571522866, 0.813693408), (3.593653396, 0.815789862), (3.604382355, 0.81680623)],
                knots=[0, 0, 0, 0, 8.2969e-05, 0.000155418, 0.000216813, 0.000269145, 0.000313783, 0.000352274, 0.000386446, 0.000418603, 0.000418603, 0.000418603, 0.000418603], degree=3))
            add(Edge.make_bspline(
                [(3.604382355, 0.81680623), (3.612636765, 0.815852155), (3.63030099, 0.813810458), (3.656311976, 0.800158343), (3.682996722, 0.779137474), (3.699041042, 0.760599725), (3.70773522, 0.750554394)],
                knots=[0, 0, 0, 0, 2.4747e-05, 5.2957e-05, 8.6566e-05, 0.000126321, 0.000126321, 0.000126321, 0.000126321], degree=3))
            Line((3.70773522, 0.750554394), (3.642543413, 0.544908694))
            add(Edge.make_bspline(
                [(3.642543413, 0.544908694), (3.636790337, 0.549953037), (3.626169317, 0.559265631), (3.610540938, 0.570655945), (3.595769021, 0.577862983), (3.586068266, 0.578887071), (3.581591724, 0.579359649)],
                knots=[0, 0, 0, 0, 2.2938e-05, 4.2347e-05, 5.8007e-05, 7.1426e-05, 7.1426e-05, 7.1426e-05, 7.1426e-05], degree=3))
            add(Edge.make_bspline(
                [(3.581591724, 0.579359649), (3.571757888, 0.578001124), (3.550680791, 0.575089364), (3.522244285, 0.55270439), (3.494902966, 0.520205459), (3.467988632, 0.474936295), (3.443312282, 0.416541398), (3.422235918, 0.344225662), (3.403069108, 0.258414172), (3.39437154, 0.196066367), (3.389726406, 0.162768103)],
                knots=[0, 0, 0, 0, 2.9319e-05, 6.284e-05, 0.000104922, 0.000157007, 0.00021992, 0.000294699, 0.000382656, 0.000483477, 0.000483477, 0.000483477, 0.000483477], degree=3))
            add(Edge.make_bspline(
                [(3.389726406, 0.162768103), (3.388046347, 0.147406041), (3.38430524, 0.113198246), (3.380334433, 0.056444872), (3.376687708, -0.01087533), (3.37343455, -0.088612162), (3.371563998, -0.176789024), (3.369950645, -0.275372709), (3.368916238, -0.38455846), (3.368659912, -0.460882316), (3.368525818, -0.500810289)],
                knots=[0, 0, 0, 0, 4.6357e-05, 0.000103227, 0.000170641, 0.000248618, 0.000336626, 0.000435222, 0.00054441, 0.000664194, 0.000664194, 0.000664194, 0.000664194], degree=3))
            Line((3.368525818, -0.500810289), (3.368525818, -1.1506083))
            Line((3.368525818, -1.1506083), (3.232842058, -1.1506083))
            Line((3.232842058, -1.1506083), (3.232842058, 0.78288529))
        make_face()
        Polygon((3.911260861, 1.563066914), (4.046944622, 1.563066914), (4.046944622, 0.78288529), (4.216549323, 0.78288529), (4.216549323, 0.545438709), (4.046944622, 0.545438709), (4.046944622, -1.1506083), (3.911260861, -1.1506083), (3.911260861, 0.545438709), (3.74165616, 0.545438709), (3.74165616, 0.78288529), (3.911260861, 0.78288529), align=None)
        with BuildLine():
            Line((5.230467425, -0.540031376), (5.335940348, -0.650804447))
            add(Edge.make_bspline(
                [(5.335940348, -0.650804447), (5.327388558, -0.680395232), (5.311032425, -0.736990493), (5.283066708, -0.817003839), (5.252602063, -0.887868362), (5.220002204, -0.949958174), (5.186083466, -1.004400122), (5.149178831, -1.051024034), (5.111140936, -1.092025781), (5.070209142, -1.125657126), (5.026896211, -1.152060238), (4.98085478, -1.171116269), (4.931908915, -1.182420247), (4.898206104, -1.183821614), (4.881187744, -1.18452924)],
                knots=[0, 0, 0, 0, 9.2394e-05, 0.000176713, 0.000254103, 0.000323567, 0.000386941, 0.00044621, 0.000501698, 0.000554428, 0.000604603, 0.000653324, 0.00070334, 0.000754356, 0.000754356, 0.000754356, 0.000754356], degree=3))
            add(Edge.make_bspline(
                [(4.881187744, -1.18452924), (4.862192286, -1.183640859), (4.824702217, -1.181887521), (4.770372815, -1.167040394), (4.719573628, -1.142547769), (4.671979834, -1.108631038), (4.62775351, -1.064982098), (4.586908837, -1.011876656), (4.549318317, -0.949358119), (4.515744605, -0.878407616), (4.485418322, -0.80181485), (4.459092128, -0.721543549), (4.435939807, -0.638913847), (4.418337775, -0.553454635), (4.404021994, -0.465928955), (4.393095087, -0.375963316), (4.387542371, -0.283399275), (4.386620015, -0.220792035), (4.386154023, -0.189161652)],
                knots=[0, 0, 0, 0, 5.6912e-05, 0.000112323, 0.000167559, 0.000225353, 0.000286821, 0.000353295, 0.000425831, 0.000505245, 0.00058851, 0.000672815, 0.000758581, 0.000845796, 0.000934411, 0.001024609, 0.001117544, 0.001212441, 0.001212441, 0.001212441, 0.001212441], degree=3))
            add(Edge.make_bspline(
                [(4.386154023, -0.189161652), (4.38641854, -0.15947328), (4.386941712, -0.100754205), (4.392331626, -0.01391278), (4.401434885, 0.070583535), (4.413567773, 0.152637188), (4.428758851, 0.232307843), (4.447976673, 0.309412503), (4.470564003, 0.384099099), (4.488551329, 0.4324547), (4.497457108, 0.456396241)],
                knots=[0, 0, 0, 0, 8.9057e-05, 0.000176141, 0.000260893, 0.000343945, 0.000424919, 0.000504105, 0.000582235, 0.000658852, 0.000658852, 0.000658852, 0.000658852], degree=3))
            add(Edge.make_bspline(
                [(4.497457108, 0.456396241), (4.509177866, 0.484695311), (4.531579128, 0.538781819), (4.570891426, 0.612710631), (4.614317055, 0.674835599), (4.659557603, 0.726769821), (4.709214855, 0.766678288), (4.761398465, 0.796196308), (4.817610236, 0.813266793), (4.855991224, 0.815619232), (4.875357583, 0.81680623)],
                knots=[0, 0, 0, 0, 9.1865e-05, 0.000175578, 0.000250565, 0.000318877, 0.000381455, 0.00044076, 0.00049777, 0.000555835, 0.000555835, 0.000555835, 0.000555835], degree=3))
            add(Edge.make_bspline(
                [(4.875357583, 0.81680623), (4.895293824, 0.815766124), (4.934950269, 0.813697184), (4.992383432, 0.794307188), (5.046596914, 0.764148707), (5.097580996, 0.721954325), (5.144306481, 0.667157498), (5.187960762, 0.600847797), (5.229598987, 0.523315753), (5.252423273, 0.466198207), (5.264388365, 0.436255683)],
                knots=[0, 0, 0, 0, 5.9647e-05, 0.000118648, 0.000179857, 0.000245006, 0.000316006, 0.000395092, 0.000482825, 0.000579493, 0.000579493, 0.000579493, 0.000579493], degree=3))
            add(Edge.make_bspline(
                [(5.264388365, 0.436255683), (5.272784054, 0.413201379), (5.289868017, 0.366289341), (5.310953551, 0.292615183), (5.32882126, 0.214921509), (5.343610193, 0.133027608), (5.3554249, 0.047109802), (5.362886308, -0.043136194), (5.368533642, -0.137504611), (5.369412498, -0.201873), (5.369861288, -0.234742915)],
                knots=[0, 0, 0, 0, 7.3588e-05, 0.000149741, 0.00022971, 0.00031267, 0.000399321, 0.000489773, 0.000584265, 0.00068287, 0.00068287, 0.00068287, 0.00068287], degree=3))
            Line((5.369861288, -0.234742915), (4.521837784, -0.234742915))
            add(Edge.make_bspline(
                [(4.521837784, -0.234742915), (4.522223367, -0.260200358), (4.522979496, -0.310122463), (4.529522067, -0.383062876), (4.5366839, -0.452732985), (4.548821593, -0.518418832), (4.56263595, -0.580931888), (4.581103039, -0.639413961), (4.600837891, -0.695188709), (4.624572169, -0.746442985), (4.650332302, -0.793118227), (4.677771688, -0.833957866), (4.706367098, -0.868954932), (4.736746774, -0.897441422), (4.768825504, -0.919689367), (4.802785121, -0.935137296), (4.838029244, -0.945279826), (4.862216749, -0.946482143), (4.874297553, -0.947082659)],
                knots=[0, 0, 0, 0, 7.6352e-05, 0.000149726, 0.000219611, 0.000286359, 0.000350001, 0.000411531, 0.000470216, 0.000527372, 0.000580756, 0.000630002, 0.000674791, 0.000716043, 0.00075456, 0.000791319, 0.000827577, 0.000863758, 0.000863758, 0.000863758, 0.000863758], degree=3))
            add(Edge.make_bspline(
                [(4.874297553, -0.947082659), (4.886184606, -0.946606939), (4.910087056, -0.945650364), (4.945518877, -0.936674712), (4.980184858, -0.922120349), (5.014006662, -0.902275022), (5.046774892, -0.878366002), (5.076256872, -0.849147568), (5.104136498, -0.817379685), (5.129934161, -0.780548935), (5.154330679, -0.735605494), (5.179305064, -0.680839707), (5.20537927, -0.614459415), (5.221685835, -0.566083374), (5.230467425, -0.540031376)],
                knots=[0, 0, 0, 0, 3.561e-05, 7.1604e-05, 0.000108909, 0.000148091, 0.000189008, 0.00023024, 0.000272322, 0.0003157, 0.000364811, 0.00042552, 0.000496187, 0.000578655, 0.000578655, 0.000578655, 0.000578655], degree=3))
        make_face()
        with BuildLine():
            add(Edge.make_bspline(
                [(5.234177528, 0.002703666), (5.229828881, 0.034010969), (5.221570987, 0.093462193), (5.206055035, 0.177480153), (5.1871108, 0.2513368), (5.165285291, 0.316092891), (5.140156345, 0.373076112), (5.111630694, 0.423985739), (5.078588501, 0.468621467), (5.042686416, 0.507162291), (5.005171417, 0.539697143), (4.964745327, 0.561871031), (4.923786263, 0.577163797), (4.895627345, 0.57863361), (4.881717759, 0.579359649)],
                knots=[0, 0, 0, 0, 9.4819e-05, 0.000180058, 0.000256161, 0.000323372, 0.000384829, 0.000442746, 0.000498081, 0.000550958, 0.000600633, 0.000646192, 0.000688765, 0.000730323, 0.000730323, 0.000730323, 0.000730323], degree=3))
            add(Edge.make_bspline(
                [(4.881717759, 0.579359649), (4.870361629, 0.578884512), (4.84767834, 0.577935449), (4.814402932, 0.569147519), (4.782733873, 0.554200788), (4.751527107, 0.534723183), (4.722771876, 0.508241261), (4.694677516, 0.476873625), (4.667814453, 0.439956298), (4.651962002, 0.412390057), (4.643741163, 0.398094625)],
                knots=[0, 0, 0, 0, 3.4024e-05, 6.7962e-05, 0.000102352, 0.000138815, 0.000177856, 0.000219143, 0.000265047, 0.000314495, 0.000314495, 0.000314495, 0.000314495], degree=3))
            add(Edge.make_bspline(
                [(4.643741163, 0.398094625), (4.63774169, 0.386514034), (4.625219089, 0.362342057), (4.609150547, 0.323043588), (4.593678832, 0.279922048), (4.579365364, 0.232510016), (4.566383143, 0.18081587), (4.554036258, 0.125196651), (4.543648899, 0.065346625), (4.537312919, 0.02409169), (4.534028122, 0.002703666)],
                knots=[0, 0, 0, 0, 3.911e-05, 8.1633e-05, 0.000127233, 0.000176527, 0.000230132, 0.000287103, 0.000347404, 0.000412322, 0.000412322, 0.000412322, 0.000412322], degree=3))
            Line((4.534028122, 0.002703666), (5.234177528, 0.002703666))
        make_face(mode=Mode.SUBTRACT)
        with BuildLine():
            Line((5.573386929, 0.78288529), (5.70907069, 0.78288529))
            Line((5.70907069, 0.78288529), (5.70907069, 0.498267402))
            add(Edge.make_bspline(
                [(5.70907069, 0.498267402), (5.717703526, 0.524552332), (5.73387465, 0.573789553), (5.761976222, 0.640457161), (5.789825043, 0.695972089), (5.818780748, 0.740367655), (5.849526025, 0.773639524), (5.879690172, 0.798808716), (5.912067738, 0.813693408), (5.934198268, 0.815789862), (5.944927227, 0.81680623)],
                knots=[0, 0, 0, 0, 8.2969e-05, 0.000155418, 0.000216813, 0.000269145, 0.000313783, 0.000352274, 0.000386446, 0.000418603, 0.000418603, 0.000418603, 0.000418603], degree=3))
            add(Edge.make_bspline(
                [(5.944927227, 0.81680623), (5.953181637, 0.815852155), (5.970845861, 0.813810458), (5.996856848, 0.800158343), (6.023541594, 0.779137474), (6.039585914, 0.760599725), (6.048280092, 0.750554394)],
                knots=[0, 0, 0, 0, 2.4747e-05, 5.2957e-05, 8.6566e-05, 0.000126321, 0.000126321, 0.000126321, 0.000126321], degree=3))
            Line((6.048280092, 0.750554394), (5.983088285, 0.544908694))
            add(Edge.make_bspline(
                [(5.983088285, 0.544908694), (5.977335209, 0.549953037), (5.966714189, 0.559265631), (5.95108581, 0.570655945), (5.936313892, 0.577862983), (5.926613138, 0.578887071), (5.922136596, 0.579359649)],
                knots=[0, 0, 0, 0, 2.2938e-05, 4.2347e-05, 5.8007e-05, 7.1426e-05, 7.1426e-05, 7.1426e-05, 7.1426e-05], degree=3))
            add(Edge.make_bspline(
                [(5.922136596, 0.579359649), (5.912302759, 0.578001124), (5.891225663, 0.575089364), (5.862789157, 0.55270439), (5.835447838, 0.520205459), (5.808533504, 0.474936295), (5.783857153, 0.416541398), (5.76278079, 0.344225662), (5.743613979, 0.258414172), (5.734916412, 0.196066367), (5.730271278, 0.162768103)],
                knots=[0, 0, 0, 0, 2.9319e-05, 6.284e-05, 0.000104922, 0.000157007, 0.00021992, 0.000294699, 0.000382656, 0.000483477, 0.000483477, 0.000483477, 0.000483477], degree=3))
            add(Edge.make_bspline(
                [(5.730271278, 0.162768103), (5.728591219, 0.147406041), (5.724850112, 0.113198246), (5.720879305, 0.056444872), (5.71723258, -0.01087533), (5.713979422, -0.088612162), (5.712108869, -0.176789024), (5.710495517, -0.275372709), (5.70946111, -0.38455846), (5.709204784, -0.460882316), (5.70907069, -0.500810289)],
                knots=[0, 0, 0, 0, 4.6357e-05, 0.000103227, 0.000170641, 0.000248618, 0.000336626, 0.000435222, 0.00054441, 0.000664194, 0.000664194, 0.000664194, 0.000664194], degree=3))
            Line((5.70907069, -0.500810289), (5.70907069, -1.1506083))
            Line((5.70907069, -1.1506083), (5.573386929, -1.1506083))
            Line((5.573386929, -1.1506083), (5.573386929, 0.78288529))
        make_face()
    extrude(amount=-EXTRUDE_3_DEPTH)


solid = part.part
